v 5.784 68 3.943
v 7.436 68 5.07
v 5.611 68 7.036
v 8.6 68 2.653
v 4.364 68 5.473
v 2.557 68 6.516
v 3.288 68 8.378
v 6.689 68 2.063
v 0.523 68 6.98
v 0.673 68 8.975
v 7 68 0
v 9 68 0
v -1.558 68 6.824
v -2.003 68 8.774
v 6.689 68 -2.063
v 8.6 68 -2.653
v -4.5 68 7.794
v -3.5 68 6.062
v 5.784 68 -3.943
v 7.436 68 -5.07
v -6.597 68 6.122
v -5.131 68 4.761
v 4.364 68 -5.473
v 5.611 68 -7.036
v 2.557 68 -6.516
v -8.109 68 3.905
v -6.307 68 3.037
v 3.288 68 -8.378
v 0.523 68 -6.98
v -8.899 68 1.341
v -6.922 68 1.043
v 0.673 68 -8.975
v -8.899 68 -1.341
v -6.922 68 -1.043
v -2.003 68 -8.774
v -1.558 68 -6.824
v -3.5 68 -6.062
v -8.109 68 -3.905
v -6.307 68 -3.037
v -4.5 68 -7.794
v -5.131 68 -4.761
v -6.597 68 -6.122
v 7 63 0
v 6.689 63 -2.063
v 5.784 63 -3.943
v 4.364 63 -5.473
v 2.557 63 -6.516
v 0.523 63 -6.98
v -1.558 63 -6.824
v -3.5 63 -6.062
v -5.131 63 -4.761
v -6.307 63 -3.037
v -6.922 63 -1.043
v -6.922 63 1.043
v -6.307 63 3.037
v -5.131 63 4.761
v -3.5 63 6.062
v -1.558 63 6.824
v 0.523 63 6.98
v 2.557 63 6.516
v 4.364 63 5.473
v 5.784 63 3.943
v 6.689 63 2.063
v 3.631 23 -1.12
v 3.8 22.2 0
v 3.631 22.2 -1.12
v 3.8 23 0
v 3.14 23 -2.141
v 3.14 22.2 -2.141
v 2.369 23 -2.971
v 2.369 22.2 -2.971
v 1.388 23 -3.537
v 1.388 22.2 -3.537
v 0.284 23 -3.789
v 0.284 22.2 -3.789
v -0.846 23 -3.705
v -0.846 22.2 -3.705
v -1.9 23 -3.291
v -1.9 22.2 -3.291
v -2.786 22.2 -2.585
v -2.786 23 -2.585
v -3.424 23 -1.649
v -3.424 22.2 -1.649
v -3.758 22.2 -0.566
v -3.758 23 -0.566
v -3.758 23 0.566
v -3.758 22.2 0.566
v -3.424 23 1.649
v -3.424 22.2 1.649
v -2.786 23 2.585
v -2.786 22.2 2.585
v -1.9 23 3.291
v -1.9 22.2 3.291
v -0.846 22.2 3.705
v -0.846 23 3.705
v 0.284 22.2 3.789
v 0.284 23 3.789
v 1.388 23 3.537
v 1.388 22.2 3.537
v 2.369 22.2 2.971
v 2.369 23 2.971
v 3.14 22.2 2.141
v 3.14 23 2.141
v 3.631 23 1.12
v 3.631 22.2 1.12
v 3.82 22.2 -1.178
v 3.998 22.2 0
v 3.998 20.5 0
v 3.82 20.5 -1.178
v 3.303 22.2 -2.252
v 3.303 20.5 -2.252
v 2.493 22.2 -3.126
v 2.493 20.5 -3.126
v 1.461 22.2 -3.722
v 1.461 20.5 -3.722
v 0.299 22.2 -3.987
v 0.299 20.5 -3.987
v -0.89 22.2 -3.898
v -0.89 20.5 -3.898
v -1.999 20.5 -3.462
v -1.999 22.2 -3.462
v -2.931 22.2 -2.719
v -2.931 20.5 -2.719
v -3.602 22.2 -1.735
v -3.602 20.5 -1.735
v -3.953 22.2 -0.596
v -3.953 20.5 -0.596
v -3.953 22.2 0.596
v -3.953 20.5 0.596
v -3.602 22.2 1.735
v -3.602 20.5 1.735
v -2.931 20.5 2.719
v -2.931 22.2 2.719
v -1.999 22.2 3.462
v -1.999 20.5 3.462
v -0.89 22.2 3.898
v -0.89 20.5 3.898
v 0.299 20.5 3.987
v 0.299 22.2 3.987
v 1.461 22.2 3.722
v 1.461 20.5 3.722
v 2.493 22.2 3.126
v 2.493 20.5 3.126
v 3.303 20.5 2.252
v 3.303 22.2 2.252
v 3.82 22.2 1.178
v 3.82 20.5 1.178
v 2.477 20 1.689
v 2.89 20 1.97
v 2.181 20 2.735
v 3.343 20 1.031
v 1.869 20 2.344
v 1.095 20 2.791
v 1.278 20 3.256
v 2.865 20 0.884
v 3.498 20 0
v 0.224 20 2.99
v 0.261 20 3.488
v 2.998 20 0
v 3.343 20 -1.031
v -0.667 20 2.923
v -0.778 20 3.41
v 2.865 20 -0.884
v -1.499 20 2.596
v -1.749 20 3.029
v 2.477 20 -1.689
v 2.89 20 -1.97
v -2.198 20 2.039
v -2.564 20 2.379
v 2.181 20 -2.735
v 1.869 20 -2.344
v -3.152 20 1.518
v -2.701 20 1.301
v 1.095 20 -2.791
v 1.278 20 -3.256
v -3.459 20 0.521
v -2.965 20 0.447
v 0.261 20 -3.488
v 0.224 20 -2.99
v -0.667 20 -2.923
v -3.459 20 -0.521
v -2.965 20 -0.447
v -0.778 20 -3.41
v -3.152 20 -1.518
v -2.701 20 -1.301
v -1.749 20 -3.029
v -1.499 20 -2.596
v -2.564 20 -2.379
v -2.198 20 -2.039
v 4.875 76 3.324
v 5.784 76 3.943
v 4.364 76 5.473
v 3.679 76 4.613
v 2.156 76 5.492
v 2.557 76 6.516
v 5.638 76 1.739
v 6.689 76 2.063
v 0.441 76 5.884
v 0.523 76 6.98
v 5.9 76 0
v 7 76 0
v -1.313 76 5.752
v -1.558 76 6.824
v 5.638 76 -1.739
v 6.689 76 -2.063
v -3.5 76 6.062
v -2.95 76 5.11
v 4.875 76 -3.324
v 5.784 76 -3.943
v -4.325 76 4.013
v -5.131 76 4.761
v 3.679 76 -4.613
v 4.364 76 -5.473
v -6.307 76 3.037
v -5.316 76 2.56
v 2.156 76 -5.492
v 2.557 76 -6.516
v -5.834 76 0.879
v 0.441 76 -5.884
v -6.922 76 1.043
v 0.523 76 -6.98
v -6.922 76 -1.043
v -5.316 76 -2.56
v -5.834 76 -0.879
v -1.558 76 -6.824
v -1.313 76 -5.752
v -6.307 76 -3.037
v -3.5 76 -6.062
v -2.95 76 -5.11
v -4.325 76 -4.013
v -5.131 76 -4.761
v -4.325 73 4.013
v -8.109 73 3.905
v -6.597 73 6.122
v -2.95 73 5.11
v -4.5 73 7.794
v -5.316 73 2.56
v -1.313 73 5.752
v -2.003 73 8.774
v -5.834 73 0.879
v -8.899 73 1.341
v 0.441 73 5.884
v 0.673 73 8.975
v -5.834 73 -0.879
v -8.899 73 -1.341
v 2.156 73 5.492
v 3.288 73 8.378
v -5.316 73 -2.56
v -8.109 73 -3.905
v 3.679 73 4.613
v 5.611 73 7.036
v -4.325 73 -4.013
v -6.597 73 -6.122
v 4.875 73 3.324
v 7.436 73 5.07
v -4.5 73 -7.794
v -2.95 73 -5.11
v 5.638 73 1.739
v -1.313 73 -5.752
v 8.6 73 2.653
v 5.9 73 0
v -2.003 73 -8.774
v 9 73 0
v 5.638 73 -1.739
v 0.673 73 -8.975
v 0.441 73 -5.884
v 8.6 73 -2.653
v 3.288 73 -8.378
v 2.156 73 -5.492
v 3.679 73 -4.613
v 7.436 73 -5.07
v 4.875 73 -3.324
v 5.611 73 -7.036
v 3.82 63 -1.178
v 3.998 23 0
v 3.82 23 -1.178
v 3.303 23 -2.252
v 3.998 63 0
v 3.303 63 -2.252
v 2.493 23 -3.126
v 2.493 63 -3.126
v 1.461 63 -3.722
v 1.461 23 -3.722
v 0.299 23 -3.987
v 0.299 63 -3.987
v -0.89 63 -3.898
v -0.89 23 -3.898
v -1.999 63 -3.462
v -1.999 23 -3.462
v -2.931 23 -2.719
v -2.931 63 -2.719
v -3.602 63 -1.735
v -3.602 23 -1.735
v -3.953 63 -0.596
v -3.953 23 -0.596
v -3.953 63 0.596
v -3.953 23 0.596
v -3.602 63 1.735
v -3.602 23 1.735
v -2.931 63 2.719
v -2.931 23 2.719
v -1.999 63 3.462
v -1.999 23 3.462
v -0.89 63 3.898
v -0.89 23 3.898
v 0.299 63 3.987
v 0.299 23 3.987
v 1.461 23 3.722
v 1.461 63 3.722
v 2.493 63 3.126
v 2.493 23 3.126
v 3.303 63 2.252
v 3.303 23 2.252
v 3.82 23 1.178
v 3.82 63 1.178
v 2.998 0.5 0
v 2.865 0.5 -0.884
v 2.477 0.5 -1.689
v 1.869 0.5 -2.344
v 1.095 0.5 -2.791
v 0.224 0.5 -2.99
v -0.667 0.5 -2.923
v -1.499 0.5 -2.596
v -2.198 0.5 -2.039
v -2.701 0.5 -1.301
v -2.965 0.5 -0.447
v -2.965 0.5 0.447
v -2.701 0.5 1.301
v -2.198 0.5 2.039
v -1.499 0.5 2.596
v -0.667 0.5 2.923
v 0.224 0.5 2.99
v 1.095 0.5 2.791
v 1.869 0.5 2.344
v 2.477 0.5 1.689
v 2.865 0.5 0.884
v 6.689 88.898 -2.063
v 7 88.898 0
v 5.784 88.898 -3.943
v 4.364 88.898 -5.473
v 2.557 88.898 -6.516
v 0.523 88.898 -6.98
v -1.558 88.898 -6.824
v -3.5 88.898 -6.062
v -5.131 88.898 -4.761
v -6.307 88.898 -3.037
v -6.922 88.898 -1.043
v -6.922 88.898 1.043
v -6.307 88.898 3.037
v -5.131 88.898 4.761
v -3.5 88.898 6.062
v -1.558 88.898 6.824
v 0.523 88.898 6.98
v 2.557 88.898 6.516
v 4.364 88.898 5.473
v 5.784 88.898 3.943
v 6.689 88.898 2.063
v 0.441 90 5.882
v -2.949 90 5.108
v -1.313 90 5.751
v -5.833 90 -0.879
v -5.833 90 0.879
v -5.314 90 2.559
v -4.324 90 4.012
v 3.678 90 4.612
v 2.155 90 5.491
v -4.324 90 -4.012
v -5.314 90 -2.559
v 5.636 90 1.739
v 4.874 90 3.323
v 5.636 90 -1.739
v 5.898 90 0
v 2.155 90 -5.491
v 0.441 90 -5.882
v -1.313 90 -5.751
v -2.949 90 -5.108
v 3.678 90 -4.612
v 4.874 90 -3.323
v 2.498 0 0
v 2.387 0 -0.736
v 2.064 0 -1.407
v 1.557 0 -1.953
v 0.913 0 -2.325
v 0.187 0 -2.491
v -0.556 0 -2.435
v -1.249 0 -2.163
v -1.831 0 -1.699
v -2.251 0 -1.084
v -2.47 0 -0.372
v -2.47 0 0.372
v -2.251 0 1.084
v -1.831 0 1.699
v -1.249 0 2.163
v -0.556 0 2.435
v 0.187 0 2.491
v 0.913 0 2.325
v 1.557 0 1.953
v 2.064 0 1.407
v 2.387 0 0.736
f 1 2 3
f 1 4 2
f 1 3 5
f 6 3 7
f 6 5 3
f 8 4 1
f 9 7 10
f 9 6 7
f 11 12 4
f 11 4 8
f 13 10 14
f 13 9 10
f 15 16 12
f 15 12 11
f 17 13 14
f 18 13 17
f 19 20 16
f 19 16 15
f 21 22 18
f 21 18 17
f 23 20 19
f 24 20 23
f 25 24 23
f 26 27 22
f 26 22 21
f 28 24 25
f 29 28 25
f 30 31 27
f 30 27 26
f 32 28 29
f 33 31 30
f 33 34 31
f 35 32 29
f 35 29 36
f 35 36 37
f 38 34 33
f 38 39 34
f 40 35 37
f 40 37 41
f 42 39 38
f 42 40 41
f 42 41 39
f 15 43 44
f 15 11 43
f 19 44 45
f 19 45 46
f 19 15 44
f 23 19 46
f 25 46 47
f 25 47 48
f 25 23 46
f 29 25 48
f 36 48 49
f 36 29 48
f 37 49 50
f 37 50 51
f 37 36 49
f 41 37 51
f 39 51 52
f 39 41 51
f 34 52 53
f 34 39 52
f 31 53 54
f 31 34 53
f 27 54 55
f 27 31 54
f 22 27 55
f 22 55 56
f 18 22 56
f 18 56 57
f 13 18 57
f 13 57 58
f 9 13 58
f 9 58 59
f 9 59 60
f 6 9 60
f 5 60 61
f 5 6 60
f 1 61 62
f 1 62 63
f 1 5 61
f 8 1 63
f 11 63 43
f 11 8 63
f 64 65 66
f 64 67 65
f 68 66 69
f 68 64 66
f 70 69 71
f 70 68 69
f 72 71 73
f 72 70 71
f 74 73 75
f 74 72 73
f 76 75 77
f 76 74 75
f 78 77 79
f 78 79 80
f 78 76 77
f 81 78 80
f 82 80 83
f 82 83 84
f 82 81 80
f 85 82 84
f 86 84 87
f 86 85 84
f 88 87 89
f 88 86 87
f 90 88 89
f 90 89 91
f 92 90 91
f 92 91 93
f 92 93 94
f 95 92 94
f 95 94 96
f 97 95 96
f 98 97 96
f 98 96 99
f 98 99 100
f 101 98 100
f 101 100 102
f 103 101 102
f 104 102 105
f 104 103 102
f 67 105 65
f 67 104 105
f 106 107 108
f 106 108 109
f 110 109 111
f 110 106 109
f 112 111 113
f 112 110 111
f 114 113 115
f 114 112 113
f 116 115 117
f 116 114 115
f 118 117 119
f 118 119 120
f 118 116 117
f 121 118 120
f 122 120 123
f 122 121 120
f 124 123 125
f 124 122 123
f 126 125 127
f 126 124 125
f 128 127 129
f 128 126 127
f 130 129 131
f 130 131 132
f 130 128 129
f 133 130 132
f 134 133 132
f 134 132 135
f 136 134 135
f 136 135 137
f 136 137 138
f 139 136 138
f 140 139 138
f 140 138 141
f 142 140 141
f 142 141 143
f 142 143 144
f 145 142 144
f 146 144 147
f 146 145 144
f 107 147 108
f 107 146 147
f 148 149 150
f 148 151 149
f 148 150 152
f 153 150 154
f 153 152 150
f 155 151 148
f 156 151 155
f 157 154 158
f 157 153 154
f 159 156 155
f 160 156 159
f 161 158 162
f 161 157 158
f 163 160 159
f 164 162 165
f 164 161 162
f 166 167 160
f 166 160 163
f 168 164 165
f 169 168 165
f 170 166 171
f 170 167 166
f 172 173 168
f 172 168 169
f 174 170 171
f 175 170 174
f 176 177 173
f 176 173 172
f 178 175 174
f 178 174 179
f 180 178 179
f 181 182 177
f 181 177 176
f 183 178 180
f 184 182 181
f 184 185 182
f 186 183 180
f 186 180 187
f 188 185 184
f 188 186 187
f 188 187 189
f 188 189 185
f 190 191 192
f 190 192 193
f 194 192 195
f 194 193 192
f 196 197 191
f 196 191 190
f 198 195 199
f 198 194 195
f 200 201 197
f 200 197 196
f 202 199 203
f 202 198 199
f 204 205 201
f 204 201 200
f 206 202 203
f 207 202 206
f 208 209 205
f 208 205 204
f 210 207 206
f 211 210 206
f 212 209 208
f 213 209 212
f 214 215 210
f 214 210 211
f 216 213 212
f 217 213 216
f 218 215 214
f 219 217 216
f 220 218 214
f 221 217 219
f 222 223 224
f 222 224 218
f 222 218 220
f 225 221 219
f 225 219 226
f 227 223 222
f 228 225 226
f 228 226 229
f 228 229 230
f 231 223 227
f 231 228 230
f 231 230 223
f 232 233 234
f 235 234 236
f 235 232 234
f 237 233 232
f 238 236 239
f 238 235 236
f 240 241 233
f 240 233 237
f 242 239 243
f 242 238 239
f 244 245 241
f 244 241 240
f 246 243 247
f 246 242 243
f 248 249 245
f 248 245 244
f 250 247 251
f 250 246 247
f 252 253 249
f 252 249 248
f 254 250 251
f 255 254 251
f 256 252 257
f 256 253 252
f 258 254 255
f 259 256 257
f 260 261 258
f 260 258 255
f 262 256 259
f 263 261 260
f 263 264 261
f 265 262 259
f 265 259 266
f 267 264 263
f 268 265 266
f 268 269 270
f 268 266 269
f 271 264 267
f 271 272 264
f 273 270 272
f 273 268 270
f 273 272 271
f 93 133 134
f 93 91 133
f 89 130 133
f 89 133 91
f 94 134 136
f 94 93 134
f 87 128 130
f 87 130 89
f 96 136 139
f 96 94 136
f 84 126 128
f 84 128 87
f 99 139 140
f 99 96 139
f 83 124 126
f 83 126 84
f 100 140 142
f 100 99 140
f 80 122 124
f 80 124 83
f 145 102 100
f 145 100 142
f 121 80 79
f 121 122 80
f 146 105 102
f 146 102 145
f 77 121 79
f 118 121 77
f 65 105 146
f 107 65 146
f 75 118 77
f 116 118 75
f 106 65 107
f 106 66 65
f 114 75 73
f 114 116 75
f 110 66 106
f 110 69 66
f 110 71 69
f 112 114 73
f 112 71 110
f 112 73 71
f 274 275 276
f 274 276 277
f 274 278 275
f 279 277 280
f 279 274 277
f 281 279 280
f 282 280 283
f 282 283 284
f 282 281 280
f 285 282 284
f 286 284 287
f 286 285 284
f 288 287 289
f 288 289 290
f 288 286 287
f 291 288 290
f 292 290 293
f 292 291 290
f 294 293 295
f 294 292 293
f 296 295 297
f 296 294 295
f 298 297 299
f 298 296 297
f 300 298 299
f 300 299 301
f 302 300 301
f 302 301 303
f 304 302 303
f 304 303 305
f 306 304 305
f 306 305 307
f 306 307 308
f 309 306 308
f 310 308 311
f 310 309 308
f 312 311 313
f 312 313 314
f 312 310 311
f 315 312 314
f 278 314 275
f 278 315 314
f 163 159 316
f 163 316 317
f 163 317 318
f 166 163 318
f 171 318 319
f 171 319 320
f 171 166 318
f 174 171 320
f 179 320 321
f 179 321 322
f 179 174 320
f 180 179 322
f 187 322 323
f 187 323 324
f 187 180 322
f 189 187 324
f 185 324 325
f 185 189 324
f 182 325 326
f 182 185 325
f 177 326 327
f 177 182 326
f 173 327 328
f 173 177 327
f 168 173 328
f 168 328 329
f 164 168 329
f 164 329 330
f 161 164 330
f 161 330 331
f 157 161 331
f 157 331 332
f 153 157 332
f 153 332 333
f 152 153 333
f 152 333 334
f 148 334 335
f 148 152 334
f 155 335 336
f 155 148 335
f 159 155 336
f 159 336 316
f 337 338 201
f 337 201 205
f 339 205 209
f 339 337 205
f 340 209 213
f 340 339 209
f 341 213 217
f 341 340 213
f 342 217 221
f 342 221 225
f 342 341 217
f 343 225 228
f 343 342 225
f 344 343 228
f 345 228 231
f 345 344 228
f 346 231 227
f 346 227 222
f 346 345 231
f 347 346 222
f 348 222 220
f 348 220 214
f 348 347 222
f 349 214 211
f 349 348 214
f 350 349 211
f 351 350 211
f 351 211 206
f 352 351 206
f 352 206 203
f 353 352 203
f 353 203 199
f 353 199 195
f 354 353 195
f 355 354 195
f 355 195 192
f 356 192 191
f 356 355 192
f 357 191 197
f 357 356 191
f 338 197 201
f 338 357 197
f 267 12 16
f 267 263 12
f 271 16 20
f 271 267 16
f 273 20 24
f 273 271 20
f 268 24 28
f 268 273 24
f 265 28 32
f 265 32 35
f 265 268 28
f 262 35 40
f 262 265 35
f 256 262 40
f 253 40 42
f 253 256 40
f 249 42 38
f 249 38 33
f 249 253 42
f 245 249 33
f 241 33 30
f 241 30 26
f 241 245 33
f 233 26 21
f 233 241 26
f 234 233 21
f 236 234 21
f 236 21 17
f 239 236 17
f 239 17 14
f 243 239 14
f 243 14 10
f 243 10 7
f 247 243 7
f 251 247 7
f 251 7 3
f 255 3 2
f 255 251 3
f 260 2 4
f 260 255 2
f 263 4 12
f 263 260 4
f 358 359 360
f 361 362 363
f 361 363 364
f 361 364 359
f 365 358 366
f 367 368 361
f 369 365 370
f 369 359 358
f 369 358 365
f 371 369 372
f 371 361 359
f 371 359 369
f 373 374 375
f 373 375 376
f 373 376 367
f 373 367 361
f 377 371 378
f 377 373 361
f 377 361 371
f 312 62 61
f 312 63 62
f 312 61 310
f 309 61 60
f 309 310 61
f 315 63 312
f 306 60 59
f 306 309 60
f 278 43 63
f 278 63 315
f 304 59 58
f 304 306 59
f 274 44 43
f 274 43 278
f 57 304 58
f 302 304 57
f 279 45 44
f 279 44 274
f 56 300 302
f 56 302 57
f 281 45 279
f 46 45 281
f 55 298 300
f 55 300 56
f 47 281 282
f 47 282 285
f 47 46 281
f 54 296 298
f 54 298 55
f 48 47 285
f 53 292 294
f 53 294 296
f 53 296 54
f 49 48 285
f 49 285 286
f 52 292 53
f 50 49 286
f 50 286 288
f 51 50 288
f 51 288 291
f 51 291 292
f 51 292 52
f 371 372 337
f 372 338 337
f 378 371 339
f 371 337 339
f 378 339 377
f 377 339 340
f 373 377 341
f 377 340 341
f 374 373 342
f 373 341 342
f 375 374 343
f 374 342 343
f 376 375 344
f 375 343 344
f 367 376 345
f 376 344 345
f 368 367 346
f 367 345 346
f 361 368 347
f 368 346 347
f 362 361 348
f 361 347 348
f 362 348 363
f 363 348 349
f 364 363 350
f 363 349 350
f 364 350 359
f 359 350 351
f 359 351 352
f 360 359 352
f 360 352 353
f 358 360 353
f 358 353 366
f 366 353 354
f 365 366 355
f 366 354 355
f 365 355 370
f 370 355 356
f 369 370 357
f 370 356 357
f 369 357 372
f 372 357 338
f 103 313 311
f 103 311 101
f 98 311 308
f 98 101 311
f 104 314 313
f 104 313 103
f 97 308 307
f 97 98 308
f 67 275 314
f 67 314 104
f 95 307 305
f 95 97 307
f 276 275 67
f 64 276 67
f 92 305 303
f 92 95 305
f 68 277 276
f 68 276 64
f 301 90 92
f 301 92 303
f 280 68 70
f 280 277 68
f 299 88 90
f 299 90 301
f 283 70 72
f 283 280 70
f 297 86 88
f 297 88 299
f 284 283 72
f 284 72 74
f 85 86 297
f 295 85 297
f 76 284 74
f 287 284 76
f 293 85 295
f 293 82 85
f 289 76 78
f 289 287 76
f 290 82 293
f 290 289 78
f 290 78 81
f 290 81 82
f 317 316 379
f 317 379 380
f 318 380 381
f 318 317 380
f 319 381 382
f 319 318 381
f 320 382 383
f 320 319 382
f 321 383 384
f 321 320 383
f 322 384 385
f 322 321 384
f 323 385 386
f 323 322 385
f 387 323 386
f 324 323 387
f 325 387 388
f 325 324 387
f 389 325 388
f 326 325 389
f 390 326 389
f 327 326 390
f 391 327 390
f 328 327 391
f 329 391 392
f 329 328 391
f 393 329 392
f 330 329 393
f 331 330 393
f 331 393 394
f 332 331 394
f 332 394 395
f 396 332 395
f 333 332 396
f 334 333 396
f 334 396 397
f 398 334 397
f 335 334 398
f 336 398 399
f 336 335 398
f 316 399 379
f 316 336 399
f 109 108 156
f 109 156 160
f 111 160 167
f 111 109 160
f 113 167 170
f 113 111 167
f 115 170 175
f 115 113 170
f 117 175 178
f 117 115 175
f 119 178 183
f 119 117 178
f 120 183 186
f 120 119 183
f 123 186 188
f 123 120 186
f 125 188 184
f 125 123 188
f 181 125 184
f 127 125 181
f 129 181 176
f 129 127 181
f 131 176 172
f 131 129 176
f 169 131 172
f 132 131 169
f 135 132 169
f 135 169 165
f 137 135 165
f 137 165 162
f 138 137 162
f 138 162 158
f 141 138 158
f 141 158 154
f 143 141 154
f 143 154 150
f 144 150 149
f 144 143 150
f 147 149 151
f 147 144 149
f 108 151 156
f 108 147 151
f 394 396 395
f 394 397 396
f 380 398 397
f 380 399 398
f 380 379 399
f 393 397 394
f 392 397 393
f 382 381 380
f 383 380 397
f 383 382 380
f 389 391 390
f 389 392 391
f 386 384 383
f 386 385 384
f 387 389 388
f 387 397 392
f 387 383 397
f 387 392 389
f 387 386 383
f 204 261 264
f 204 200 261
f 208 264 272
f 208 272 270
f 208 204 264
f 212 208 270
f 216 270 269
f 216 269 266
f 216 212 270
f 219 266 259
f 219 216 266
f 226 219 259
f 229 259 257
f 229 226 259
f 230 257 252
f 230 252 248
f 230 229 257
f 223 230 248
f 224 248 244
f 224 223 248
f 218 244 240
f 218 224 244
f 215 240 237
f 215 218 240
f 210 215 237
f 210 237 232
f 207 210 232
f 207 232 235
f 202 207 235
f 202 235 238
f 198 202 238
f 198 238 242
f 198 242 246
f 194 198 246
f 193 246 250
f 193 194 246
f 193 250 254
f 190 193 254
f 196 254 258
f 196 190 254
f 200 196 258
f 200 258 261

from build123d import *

# Parameters (mm, degrees)
CROQUIS1_W    = 2
CROQUIS1_H    = 5
CHAFL_N2_SIZE = 0.5


# Read off the part's stored shape, not the designer's step: M14 Roscas Standard Taladro1
with BuildPart() as part:
    # Croquis1 → Revolución1 (revolve)
    with BuildSketch(Plane.XY):
        Polygon((0, 90), (0, 0), (2.998, 0), (2.998, 20), (3.998, 20), (3.998, 22.2), (3.8, 22.2), (3.8, 23), (3.998, 23), (3.998, 63), (7, 63), (7, 68), (7, 73), (5.9, 73), (5.9, 76), (7, 76), (7, 90), align=None)
        with Locations((8, 70.5)):
            Rectangle(CROQUIS1_W, CROQUIS1_H)
    revolve(axis=Axis((0, 0, 0), (0, 1, 0)))

    # M14 Roscas Standard Taladro1 outline → M14 Roscas Standard Taladro1 (revolve, cut)
    with BuildSketch(Plane.XY):
        Polygon((7, 90), (5.8985, 90), (7, 88.8985), align=None)
    revolve(axis=Axis((0, 0, 0), (0, 1, 0)), mode=Mode.SUBTRACT)

    # Chaflán2
    chafl_n2_edges = [part.edges().sort_by_distance(p)[0] for p in [
        (-3.998, 20, 0),
        (-2.998, 0, 0),
    ]]
    chamfer(chafl_n2_edges, length=CHAFL_N2_SIZE)


solid = part.part
